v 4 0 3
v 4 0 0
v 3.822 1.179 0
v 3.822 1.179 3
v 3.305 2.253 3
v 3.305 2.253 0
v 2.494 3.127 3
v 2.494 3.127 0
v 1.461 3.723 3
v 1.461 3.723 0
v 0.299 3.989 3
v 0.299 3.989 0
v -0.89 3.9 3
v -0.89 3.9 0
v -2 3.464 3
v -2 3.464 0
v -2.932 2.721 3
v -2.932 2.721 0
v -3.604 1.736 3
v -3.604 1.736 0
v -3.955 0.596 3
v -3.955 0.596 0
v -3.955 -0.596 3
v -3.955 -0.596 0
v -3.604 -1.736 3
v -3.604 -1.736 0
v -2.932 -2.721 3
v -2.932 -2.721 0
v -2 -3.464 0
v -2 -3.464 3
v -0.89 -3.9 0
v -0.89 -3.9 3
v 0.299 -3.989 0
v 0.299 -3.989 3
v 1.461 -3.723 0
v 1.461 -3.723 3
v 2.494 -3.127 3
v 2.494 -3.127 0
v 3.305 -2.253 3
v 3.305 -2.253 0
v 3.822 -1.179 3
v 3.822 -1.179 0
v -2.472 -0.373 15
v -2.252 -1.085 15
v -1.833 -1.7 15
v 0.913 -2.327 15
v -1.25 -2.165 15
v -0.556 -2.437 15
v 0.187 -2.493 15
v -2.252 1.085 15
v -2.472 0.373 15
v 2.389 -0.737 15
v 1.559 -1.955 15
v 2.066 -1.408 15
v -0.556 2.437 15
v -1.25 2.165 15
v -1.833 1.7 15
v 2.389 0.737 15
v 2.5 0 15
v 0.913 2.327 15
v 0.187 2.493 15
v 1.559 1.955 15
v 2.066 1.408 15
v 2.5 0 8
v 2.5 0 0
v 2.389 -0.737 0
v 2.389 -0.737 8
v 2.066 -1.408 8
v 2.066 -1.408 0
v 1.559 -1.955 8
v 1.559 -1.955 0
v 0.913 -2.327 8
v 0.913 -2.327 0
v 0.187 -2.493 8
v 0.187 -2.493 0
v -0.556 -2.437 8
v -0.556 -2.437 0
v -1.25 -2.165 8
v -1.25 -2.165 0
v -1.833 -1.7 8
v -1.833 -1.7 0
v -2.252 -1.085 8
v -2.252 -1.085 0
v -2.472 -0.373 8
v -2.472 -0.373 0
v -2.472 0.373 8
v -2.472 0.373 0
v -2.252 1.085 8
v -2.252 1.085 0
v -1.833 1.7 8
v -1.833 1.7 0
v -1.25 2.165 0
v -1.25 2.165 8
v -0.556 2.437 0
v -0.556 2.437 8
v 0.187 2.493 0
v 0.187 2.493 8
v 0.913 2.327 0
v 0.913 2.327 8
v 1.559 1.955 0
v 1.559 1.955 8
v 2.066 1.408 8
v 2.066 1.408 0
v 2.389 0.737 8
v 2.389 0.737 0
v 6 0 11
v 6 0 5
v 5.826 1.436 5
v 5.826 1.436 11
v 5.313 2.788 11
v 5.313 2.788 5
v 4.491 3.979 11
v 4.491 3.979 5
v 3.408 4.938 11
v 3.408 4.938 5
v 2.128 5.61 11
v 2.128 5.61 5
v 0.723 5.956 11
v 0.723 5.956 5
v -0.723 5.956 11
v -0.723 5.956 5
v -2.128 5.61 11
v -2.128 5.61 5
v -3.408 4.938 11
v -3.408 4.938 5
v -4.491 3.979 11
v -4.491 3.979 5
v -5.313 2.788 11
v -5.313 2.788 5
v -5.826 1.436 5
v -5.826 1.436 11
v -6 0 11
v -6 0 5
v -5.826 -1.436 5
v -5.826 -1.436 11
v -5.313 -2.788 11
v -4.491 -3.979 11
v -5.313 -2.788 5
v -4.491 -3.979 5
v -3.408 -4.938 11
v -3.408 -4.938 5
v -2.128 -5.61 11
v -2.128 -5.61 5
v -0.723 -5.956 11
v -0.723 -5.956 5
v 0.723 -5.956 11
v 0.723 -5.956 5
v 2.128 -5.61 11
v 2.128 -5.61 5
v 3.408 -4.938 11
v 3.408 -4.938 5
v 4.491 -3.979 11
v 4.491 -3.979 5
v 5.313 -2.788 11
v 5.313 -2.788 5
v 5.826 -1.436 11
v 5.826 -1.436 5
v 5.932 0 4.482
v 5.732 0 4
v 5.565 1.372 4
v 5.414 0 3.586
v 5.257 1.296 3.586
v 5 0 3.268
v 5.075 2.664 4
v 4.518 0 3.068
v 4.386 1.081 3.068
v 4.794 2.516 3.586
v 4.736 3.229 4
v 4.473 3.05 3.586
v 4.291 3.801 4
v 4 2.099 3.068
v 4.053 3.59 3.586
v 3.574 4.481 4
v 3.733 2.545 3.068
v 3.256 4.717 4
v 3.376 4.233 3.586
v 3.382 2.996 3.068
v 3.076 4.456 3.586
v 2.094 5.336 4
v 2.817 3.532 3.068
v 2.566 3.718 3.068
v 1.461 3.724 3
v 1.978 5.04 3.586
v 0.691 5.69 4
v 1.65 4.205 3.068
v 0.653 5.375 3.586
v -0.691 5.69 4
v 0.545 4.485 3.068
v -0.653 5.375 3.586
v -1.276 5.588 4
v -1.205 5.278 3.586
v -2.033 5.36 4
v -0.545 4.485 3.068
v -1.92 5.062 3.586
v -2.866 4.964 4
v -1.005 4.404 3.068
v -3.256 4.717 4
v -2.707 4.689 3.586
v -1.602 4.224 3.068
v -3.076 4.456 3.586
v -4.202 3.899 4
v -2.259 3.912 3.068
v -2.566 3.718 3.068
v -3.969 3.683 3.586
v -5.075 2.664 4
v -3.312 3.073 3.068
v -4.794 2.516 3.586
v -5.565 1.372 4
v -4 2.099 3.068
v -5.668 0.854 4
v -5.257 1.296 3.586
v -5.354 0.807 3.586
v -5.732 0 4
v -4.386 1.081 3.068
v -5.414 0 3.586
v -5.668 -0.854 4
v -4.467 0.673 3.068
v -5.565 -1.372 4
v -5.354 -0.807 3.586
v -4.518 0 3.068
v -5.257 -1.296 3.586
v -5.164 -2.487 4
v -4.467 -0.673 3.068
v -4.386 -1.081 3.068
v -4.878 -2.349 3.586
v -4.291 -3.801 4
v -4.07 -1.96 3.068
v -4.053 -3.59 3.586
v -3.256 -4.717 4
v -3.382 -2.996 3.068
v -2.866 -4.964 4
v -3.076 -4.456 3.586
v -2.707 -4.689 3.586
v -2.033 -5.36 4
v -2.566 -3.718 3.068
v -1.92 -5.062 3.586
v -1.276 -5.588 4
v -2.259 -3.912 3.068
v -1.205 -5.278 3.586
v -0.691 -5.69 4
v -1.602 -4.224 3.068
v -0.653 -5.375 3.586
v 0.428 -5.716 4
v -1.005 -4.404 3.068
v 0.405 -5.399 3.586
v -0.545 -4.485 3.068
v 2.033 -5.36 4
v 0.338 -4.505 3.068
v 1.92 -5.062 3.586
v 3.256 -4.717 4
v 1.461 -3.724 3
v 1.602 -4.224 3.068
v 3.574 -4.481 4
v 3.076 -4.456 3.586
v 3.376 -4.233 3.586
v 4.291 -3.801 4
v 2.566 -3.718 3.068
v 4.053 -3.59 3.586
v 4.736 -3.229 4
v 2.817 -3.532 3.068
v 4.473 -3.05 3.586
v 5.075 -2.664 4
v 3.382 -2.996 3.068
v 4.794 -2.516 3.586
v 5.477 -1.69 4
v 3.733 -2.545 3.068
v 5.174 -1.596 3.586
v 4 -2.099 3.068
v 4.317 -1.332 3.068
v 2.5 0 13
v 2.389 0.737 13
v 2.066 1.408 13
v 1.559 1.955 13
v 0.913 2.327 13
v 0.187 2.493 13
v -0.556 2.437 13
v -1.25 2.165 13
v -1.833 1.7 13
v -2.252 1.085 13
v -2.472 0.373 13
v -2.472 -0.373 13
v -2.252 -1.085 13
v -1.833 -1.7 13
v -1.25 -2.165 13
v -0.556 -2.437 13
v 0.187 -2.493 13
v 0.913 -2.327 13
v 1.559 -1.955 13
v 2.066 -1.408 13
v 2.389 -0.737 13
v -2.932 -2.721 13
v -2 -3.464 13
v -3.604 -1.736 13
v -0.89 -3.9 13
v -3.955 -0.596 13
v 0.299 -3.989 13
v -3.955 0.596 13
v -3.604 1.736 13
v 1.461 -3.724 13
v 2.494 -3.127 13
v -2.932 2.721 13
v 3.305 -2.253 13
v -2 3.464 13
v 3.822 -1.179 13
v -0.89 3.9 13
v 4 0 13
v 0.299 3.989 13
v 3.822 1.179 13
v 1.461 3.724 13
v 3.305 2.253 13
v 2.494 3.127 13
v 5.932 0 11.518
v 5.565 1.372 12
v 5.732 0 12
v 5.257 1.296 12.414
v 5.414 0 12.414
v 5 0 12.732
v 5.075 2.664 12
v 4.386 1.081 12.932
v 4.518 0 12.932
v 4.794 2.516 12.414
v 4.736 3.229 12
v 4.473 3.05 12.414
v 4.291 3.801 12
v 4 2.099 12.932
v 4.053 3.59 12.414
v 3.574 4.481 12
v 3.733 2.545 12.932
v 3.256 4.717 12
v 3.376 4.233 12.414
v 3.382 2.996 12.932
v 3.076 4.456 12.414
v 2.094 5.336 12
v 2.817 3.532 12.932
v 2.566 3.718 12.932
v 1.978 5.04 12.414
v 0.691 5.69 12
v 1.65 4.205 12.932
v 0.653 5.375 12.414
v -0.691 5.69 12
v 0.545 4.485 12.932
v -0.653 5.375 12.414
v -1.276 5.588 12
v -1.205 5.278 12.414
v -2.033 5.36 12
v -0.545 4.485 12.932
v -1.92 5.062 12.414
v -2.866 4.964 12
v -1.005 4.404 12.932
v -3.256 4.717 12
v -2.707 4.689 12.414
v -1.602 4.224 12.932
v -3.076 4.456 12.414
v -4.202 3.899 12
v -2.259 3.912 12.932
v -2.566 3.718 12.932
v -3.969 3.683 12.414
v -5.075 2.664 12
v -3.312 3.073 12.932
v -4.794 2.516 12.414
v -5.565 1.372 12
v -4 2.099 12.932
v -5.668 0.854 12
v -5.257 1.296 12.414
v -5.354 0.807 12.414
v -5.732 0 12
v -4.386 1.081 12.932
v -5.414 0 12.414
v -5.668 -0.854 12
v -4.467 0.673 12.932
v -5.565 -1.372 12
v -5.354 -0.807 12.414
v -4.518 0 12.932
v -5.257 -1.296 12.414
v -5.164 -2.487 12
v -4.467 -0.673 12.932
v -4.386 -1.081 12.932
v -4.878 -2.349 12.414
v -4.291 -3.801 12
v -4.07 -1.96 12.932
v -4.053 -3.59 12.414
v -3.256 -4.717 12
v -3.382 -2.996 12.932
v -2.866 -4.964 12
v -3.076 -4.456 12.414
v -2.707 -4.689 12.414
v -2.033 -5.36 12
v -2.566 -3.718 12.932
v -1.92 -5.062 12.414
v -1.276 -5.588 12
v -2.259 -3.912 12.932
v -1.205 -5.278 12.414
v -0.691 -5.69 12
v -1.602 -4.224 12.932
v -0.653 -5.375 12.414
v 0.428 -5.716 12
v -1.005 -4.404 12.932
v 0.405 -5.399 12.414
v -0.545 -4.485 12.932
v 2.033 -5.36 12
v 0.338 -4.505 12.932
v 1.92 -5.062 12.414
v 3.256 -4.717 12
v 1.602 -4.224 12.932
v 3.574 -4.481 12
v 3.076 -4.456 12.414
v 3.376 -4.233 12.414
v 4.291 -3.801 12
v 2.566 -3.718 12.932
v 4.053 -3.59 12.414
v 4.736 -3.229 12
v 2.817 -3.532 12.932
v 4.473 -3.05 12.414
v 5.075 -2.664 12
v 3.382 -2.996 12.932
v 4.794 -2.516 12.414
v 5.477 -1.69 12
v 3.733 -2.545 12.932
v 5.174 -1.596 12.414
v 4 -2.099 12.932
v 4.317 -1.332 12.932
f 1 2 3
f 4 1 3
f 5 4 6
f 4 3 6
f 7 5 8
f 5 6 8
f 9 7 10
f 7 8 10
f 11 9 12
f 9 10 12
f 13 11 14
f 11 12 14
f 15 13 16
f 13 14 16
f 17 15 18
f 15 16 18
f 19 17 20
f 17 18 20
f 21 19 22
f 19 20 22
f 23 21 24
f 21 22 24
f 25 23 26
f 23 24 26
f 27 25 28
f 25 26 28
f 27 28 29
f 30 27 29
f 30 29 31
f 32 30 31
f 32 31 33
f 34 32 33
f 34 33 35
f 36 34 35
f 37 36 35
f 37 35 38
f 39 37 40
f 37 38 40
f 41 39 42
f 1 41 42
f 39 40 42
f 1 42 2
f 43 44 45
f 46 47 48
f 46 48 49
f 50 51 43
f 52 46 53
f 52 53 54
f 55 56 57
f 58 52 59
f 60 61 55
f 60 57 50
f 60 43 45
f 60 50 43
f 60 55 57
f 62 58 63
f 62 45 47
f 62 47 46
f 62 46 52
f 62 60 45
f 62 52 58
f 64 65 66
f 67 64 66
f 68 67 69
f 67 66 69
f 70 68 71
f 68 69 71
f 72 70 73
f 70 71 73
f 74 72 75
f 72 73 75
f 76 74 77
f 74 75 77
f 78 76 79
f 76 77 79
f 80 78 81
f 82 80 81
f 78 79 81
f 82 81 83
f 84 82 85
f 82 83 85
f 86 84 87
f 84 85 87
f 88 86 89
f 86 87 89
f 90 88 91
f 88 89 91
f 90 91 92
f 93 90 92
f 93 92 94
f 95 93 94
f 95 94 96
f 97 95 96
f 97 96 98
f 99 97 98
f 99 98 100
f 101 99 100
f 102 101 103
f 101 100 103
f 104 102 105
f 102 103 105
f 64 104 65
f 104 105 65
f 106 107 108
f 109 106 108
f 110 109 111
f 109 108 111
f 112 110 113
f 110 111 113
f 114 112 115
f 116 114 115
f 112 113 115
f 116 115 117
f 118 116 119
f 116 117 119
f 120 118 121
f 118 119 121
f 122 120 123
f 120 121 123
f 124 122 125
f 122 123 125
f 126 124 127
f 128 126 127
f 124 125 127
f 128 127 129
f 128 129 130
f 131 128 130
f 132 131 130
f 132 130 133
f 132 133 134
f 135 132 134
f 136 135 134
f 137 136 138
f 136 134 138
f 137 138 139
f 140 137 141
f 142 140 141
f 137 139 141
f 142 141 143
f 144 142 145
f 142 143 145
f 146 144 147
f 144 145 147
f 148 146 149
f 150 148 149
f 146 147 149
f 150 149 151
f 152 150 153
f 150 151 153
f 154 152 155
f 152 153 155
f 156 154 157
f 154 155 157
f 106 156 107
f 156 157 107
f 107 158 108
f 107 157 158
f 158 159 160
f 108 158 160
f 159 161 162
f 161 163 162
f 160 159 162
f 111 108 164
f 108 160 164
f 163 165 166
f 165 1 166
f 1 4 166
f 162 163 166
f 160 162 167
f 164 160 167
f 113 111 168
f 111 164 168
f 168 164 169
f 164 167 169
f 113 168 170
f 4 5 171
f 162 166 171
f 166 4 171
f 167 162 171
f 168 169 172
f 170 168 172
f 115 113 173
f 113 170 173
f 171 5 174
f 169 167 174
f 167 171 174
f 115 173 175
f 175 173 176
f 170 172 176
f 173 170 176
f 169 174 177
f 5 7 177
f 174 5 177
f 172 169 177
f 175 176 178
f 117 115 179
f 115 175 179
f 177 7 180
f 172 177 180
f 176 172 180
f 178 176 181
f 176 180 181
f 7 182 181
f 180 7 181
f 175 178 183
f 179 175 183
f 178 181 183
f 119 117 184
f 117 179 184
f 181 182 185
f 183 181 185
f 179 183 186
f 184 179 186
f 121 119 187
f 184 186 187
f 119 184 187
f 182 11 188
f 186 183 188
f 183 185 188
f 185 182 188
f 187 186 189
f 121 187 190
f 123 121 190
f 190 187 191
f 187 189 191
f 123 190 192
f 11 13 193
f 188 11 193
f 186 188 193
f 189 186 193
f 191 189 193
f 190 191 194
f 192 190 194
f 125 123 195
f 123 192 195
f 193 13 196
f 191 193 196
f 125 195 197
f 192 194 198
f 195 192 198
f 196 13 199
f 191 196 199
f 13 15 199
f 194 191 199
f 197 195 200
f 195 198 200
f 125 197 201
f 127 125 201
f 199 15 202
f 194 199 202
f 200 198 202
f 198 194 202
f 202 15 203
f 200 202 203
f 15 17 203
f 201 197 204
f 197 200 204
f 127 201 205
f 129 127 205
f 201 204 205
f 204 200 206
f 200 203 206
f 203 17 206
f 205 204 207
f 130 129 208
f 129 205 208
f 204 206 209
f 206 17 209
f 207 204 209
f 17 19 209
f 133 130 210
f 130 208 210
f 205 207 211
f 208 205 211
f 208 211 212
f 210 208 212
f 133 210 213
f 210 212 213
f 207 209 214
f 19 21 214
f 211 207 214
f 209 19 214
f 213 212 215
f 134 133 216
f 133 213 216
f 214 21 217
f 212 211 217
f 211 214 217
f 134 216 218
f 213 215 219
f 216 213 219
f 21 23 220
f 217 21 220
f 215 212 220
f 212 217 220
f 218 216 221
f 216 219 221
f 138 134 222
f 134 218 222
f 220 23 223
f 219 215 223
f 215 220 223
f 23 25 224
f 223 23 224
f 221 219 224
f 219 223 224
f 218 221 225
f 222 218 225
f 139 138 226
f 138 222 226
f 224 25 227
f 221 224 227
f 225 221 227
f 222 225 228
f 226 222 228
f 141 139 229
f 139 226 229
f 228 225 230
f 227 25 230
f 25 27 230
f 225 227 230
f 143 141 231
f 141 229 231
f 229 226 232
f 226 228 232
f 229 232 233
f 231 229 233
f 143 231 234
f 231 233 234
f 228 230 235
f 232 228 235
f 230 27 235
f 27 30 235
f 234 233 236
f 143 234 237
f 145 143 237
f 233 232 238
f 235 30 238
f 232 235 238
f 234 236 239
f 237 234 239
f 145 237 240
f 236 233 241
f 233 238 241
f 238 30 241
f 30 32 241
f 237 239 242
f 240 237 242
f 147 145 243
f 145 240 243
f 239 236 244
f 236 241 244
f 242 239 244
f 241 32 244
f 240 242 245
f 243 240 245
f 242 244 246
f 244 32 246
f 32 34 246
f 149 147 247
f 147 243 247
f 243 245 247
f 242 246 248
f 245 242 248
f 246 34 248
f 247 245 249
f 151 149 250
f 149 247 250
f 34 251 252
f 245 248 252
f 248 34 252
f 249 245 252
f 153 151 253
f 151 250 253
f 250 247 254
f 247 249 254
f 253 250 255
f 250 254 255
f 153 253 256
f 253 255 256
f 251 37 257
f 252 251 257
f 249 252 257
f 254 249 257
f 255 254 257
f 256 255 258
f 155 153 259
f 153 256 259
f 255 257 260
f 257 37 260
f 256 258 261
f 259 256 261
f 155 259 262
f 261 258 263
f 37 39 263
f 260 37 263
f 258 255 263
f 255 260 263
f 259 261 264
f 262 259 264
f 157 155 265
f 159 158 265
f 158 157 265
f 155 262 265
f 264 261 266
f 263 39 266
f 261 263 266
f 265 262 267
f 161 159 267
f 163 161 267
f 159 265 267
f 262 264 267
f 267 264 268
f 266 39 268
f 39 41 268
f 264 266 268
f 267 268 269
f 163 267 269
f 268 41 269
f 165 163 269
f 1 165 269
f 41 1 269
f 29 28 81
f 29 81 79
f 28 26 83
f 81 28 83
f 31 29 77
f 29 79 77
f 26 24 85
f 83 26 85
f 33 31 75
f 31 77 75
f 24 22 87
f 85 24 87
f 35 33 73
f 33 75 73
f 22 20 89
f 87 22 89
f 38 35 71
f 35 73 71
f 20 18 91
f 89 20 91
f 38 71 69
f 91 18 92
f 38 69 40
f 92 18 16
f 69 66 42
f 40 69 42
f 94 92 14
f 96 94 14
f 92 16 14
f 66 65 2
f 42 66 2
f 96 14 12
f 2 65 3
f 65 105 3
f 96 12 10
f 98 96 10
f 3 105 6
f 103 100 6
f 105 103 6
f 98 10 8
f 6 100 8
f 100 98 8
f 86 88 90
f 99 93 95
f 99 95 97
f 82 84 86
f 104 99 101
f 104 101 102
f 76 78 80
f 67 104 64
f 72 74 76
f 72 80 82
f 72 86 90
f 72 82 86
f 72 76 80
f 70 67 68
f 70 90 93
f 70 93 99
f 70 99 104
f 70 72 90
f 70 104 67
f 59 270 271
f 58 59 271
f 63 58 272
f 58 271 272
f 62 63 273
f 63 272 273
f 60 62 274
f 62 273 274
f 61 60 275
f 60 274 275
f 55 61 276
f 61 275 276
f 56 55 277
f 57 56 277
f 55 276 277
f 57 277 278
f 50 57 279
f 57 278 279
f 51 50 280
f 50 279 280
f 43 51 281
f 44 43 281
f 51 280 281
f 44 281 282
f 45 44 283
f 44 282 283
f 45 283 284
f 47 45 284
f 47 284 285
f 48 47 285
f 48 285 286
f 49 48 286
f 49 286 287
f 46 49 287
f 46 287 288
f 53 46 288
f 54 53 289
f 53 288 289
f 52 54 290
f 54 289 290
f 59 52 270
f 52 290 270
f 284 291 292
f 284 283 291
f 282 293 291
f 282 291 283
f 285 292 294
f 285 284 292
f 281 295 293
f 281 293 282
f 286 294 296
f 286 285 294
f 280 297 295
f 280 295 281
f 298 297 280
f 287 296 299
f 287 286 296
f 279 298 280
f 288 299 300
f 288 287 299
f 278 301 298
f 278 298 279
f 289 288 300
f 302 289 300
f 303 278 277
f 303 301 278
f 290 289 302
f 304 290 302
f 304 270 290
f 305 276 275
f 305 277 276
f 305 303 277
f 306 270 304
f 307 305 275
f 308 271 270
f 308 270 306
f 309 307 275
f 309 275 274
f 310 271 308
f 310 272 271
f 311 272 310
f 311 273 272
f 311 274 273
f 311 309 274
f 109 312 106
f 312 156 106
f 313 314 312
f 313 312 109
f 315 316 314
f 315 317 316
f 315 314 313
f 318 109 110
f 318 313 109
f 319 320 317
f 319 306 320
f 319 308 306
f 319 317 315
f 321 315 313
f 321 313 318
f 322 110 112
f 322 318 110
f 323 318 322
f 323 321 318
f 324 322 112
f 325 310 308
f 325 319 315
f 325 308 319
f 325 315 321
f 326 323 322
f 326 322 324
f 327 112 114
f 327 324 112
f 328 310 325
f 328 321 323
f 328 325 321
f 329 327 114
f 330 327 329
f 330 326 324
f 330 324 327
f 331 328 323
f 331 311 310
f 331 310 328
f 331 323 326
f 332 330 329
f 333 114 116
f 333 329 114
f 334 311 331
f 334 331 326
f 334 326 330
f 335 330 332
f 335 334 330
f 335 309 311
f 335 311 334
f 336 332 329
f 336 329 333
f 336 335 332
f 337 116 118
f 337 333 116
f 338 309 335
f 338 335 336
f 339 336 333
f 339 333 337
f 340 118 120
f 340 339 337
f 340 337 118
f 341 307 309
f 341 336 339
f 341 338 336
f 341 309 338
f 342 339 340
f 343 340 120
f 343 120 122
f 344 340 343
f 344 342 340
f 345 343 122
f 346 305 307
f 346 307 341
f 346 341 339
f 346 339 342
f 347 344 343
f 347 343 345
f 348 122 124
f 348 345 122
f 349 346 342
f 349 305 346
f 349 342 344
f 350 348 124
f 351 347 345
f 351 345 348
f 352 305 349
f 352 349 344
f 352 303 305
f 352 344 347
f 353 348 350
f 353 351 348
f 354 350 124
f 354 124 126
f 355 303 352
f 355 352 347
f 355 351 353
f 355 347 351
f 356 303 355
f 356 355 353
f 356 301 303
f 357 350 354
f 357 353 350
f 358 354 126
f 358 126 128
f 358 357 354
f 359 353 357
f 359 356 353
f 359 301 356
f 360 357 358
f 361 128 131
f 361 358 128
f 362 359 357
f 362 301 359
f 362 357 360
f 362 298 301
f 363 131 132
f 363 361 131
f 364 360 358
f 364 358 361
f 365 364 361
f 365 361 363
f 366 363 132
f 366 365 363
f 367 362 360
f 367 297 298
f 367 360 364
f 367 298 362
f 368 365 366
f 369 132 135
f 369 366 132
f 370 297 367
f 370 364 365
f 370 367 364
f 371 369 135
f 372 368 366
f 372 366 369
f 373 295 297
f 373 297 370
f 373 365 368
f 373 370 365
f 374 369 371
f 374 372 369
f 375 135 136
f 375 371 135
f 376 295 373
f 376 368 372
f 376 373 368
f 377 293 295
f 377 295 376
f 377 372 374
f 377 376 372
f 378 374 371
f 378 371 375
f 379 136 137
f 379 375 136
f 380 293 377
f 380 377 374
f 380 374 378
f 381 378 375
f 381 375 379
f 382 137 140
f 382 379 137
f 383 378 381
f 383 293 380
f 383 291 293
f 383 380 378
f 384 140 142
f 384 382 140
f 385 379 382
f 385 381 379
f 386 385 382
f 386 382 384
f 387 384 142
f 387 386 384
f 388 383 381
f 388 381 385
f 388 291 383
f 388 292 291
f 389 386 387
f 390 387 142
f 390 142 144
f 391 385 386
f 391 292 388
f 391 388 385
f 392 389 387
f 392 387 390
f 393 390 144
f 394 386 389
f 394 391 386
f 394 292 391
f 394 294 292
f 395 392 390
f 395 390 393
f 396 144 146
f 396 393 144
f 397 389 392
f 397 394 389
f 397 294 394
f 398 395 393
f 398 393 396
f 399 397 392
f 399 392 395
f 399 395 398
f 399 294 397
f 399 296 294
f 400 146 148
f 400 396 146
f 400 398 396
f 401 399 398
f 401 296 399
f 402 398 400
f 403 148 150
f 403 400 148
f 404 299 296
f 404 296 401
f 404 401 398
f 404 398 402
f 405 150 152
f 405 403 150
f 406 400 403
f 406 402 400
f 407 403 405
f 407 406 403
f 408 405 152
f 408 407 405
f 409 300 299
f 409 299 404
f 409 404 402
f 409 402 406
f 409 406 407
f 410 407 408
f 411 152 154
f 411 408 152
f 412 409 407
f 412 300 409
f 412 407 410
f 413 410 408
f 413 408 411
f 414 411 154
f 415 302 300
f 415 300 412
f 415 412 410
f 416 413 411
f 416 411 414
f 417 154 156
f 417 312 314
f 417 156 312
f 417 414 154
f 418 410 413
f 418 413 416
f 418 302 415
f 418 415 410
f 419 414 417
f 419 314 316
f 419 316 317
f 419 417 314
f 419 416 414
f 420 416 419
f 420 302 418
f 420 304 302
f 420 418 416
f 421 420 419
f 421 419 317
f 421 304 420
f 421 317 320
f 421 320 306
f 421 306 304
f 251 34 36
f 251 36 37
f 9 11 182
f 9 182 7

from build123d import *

# Parameters (mm, degrees)
F0_R     = 4
F1_DEPTH = 3
F2_R     = 6
F3_DEPTH = 10
F4_R     = 2.5
F5_DEPTH = 2
F6_R     = 1.99999
F7_R     = 2.5
F8_DEPTH = 8


# Not quite as in the source:
# - a fillet or chamfer is up to 0.001 mm smaller than in the source, because OpenCascade refuses the exact size


with BuildPart() as f1:
    # F0 (on Top) → F1 (new body)
    with BuildSketch(Plane.XY):
        Circle(F0_R)
    extrude(amount=F1_DEPTH)

    # F2 (on face) → F3 (join)
    with BuildSketch(Plane.XY.offset(3)):
        Circle(F2_R)
    extrude(amount=F3_DEPTH)

    # F4 (on face) → F5 (join)
    with BuildSketch(Plane.XY.offset(13)):
        Circle(F4_R)
    extrude(amount=F5_DEPTH)

    # F6 (radius 2 in the source; OpenCascade refuses exactly that, so slightly less here)
    f6_edges = [f1.edges().sort_by_distance(p)[0] for p in [
        (-6, 0, 13),
        (-6, 0, 3),
    ]]
    fillet(f6_edges, radius=F6_R)

    # F7 (on face) → F8 (cut)
    with BuildSketch(Plane(origin=(0, 0, 0), x_dir=(1, 0, 0), z_dir=(0, 0, -1))):
        Circle(F7_R)
    extrude(amount=-F8_DEPTH, mode=Mode.SUBTRACT)


solid = f1.part
